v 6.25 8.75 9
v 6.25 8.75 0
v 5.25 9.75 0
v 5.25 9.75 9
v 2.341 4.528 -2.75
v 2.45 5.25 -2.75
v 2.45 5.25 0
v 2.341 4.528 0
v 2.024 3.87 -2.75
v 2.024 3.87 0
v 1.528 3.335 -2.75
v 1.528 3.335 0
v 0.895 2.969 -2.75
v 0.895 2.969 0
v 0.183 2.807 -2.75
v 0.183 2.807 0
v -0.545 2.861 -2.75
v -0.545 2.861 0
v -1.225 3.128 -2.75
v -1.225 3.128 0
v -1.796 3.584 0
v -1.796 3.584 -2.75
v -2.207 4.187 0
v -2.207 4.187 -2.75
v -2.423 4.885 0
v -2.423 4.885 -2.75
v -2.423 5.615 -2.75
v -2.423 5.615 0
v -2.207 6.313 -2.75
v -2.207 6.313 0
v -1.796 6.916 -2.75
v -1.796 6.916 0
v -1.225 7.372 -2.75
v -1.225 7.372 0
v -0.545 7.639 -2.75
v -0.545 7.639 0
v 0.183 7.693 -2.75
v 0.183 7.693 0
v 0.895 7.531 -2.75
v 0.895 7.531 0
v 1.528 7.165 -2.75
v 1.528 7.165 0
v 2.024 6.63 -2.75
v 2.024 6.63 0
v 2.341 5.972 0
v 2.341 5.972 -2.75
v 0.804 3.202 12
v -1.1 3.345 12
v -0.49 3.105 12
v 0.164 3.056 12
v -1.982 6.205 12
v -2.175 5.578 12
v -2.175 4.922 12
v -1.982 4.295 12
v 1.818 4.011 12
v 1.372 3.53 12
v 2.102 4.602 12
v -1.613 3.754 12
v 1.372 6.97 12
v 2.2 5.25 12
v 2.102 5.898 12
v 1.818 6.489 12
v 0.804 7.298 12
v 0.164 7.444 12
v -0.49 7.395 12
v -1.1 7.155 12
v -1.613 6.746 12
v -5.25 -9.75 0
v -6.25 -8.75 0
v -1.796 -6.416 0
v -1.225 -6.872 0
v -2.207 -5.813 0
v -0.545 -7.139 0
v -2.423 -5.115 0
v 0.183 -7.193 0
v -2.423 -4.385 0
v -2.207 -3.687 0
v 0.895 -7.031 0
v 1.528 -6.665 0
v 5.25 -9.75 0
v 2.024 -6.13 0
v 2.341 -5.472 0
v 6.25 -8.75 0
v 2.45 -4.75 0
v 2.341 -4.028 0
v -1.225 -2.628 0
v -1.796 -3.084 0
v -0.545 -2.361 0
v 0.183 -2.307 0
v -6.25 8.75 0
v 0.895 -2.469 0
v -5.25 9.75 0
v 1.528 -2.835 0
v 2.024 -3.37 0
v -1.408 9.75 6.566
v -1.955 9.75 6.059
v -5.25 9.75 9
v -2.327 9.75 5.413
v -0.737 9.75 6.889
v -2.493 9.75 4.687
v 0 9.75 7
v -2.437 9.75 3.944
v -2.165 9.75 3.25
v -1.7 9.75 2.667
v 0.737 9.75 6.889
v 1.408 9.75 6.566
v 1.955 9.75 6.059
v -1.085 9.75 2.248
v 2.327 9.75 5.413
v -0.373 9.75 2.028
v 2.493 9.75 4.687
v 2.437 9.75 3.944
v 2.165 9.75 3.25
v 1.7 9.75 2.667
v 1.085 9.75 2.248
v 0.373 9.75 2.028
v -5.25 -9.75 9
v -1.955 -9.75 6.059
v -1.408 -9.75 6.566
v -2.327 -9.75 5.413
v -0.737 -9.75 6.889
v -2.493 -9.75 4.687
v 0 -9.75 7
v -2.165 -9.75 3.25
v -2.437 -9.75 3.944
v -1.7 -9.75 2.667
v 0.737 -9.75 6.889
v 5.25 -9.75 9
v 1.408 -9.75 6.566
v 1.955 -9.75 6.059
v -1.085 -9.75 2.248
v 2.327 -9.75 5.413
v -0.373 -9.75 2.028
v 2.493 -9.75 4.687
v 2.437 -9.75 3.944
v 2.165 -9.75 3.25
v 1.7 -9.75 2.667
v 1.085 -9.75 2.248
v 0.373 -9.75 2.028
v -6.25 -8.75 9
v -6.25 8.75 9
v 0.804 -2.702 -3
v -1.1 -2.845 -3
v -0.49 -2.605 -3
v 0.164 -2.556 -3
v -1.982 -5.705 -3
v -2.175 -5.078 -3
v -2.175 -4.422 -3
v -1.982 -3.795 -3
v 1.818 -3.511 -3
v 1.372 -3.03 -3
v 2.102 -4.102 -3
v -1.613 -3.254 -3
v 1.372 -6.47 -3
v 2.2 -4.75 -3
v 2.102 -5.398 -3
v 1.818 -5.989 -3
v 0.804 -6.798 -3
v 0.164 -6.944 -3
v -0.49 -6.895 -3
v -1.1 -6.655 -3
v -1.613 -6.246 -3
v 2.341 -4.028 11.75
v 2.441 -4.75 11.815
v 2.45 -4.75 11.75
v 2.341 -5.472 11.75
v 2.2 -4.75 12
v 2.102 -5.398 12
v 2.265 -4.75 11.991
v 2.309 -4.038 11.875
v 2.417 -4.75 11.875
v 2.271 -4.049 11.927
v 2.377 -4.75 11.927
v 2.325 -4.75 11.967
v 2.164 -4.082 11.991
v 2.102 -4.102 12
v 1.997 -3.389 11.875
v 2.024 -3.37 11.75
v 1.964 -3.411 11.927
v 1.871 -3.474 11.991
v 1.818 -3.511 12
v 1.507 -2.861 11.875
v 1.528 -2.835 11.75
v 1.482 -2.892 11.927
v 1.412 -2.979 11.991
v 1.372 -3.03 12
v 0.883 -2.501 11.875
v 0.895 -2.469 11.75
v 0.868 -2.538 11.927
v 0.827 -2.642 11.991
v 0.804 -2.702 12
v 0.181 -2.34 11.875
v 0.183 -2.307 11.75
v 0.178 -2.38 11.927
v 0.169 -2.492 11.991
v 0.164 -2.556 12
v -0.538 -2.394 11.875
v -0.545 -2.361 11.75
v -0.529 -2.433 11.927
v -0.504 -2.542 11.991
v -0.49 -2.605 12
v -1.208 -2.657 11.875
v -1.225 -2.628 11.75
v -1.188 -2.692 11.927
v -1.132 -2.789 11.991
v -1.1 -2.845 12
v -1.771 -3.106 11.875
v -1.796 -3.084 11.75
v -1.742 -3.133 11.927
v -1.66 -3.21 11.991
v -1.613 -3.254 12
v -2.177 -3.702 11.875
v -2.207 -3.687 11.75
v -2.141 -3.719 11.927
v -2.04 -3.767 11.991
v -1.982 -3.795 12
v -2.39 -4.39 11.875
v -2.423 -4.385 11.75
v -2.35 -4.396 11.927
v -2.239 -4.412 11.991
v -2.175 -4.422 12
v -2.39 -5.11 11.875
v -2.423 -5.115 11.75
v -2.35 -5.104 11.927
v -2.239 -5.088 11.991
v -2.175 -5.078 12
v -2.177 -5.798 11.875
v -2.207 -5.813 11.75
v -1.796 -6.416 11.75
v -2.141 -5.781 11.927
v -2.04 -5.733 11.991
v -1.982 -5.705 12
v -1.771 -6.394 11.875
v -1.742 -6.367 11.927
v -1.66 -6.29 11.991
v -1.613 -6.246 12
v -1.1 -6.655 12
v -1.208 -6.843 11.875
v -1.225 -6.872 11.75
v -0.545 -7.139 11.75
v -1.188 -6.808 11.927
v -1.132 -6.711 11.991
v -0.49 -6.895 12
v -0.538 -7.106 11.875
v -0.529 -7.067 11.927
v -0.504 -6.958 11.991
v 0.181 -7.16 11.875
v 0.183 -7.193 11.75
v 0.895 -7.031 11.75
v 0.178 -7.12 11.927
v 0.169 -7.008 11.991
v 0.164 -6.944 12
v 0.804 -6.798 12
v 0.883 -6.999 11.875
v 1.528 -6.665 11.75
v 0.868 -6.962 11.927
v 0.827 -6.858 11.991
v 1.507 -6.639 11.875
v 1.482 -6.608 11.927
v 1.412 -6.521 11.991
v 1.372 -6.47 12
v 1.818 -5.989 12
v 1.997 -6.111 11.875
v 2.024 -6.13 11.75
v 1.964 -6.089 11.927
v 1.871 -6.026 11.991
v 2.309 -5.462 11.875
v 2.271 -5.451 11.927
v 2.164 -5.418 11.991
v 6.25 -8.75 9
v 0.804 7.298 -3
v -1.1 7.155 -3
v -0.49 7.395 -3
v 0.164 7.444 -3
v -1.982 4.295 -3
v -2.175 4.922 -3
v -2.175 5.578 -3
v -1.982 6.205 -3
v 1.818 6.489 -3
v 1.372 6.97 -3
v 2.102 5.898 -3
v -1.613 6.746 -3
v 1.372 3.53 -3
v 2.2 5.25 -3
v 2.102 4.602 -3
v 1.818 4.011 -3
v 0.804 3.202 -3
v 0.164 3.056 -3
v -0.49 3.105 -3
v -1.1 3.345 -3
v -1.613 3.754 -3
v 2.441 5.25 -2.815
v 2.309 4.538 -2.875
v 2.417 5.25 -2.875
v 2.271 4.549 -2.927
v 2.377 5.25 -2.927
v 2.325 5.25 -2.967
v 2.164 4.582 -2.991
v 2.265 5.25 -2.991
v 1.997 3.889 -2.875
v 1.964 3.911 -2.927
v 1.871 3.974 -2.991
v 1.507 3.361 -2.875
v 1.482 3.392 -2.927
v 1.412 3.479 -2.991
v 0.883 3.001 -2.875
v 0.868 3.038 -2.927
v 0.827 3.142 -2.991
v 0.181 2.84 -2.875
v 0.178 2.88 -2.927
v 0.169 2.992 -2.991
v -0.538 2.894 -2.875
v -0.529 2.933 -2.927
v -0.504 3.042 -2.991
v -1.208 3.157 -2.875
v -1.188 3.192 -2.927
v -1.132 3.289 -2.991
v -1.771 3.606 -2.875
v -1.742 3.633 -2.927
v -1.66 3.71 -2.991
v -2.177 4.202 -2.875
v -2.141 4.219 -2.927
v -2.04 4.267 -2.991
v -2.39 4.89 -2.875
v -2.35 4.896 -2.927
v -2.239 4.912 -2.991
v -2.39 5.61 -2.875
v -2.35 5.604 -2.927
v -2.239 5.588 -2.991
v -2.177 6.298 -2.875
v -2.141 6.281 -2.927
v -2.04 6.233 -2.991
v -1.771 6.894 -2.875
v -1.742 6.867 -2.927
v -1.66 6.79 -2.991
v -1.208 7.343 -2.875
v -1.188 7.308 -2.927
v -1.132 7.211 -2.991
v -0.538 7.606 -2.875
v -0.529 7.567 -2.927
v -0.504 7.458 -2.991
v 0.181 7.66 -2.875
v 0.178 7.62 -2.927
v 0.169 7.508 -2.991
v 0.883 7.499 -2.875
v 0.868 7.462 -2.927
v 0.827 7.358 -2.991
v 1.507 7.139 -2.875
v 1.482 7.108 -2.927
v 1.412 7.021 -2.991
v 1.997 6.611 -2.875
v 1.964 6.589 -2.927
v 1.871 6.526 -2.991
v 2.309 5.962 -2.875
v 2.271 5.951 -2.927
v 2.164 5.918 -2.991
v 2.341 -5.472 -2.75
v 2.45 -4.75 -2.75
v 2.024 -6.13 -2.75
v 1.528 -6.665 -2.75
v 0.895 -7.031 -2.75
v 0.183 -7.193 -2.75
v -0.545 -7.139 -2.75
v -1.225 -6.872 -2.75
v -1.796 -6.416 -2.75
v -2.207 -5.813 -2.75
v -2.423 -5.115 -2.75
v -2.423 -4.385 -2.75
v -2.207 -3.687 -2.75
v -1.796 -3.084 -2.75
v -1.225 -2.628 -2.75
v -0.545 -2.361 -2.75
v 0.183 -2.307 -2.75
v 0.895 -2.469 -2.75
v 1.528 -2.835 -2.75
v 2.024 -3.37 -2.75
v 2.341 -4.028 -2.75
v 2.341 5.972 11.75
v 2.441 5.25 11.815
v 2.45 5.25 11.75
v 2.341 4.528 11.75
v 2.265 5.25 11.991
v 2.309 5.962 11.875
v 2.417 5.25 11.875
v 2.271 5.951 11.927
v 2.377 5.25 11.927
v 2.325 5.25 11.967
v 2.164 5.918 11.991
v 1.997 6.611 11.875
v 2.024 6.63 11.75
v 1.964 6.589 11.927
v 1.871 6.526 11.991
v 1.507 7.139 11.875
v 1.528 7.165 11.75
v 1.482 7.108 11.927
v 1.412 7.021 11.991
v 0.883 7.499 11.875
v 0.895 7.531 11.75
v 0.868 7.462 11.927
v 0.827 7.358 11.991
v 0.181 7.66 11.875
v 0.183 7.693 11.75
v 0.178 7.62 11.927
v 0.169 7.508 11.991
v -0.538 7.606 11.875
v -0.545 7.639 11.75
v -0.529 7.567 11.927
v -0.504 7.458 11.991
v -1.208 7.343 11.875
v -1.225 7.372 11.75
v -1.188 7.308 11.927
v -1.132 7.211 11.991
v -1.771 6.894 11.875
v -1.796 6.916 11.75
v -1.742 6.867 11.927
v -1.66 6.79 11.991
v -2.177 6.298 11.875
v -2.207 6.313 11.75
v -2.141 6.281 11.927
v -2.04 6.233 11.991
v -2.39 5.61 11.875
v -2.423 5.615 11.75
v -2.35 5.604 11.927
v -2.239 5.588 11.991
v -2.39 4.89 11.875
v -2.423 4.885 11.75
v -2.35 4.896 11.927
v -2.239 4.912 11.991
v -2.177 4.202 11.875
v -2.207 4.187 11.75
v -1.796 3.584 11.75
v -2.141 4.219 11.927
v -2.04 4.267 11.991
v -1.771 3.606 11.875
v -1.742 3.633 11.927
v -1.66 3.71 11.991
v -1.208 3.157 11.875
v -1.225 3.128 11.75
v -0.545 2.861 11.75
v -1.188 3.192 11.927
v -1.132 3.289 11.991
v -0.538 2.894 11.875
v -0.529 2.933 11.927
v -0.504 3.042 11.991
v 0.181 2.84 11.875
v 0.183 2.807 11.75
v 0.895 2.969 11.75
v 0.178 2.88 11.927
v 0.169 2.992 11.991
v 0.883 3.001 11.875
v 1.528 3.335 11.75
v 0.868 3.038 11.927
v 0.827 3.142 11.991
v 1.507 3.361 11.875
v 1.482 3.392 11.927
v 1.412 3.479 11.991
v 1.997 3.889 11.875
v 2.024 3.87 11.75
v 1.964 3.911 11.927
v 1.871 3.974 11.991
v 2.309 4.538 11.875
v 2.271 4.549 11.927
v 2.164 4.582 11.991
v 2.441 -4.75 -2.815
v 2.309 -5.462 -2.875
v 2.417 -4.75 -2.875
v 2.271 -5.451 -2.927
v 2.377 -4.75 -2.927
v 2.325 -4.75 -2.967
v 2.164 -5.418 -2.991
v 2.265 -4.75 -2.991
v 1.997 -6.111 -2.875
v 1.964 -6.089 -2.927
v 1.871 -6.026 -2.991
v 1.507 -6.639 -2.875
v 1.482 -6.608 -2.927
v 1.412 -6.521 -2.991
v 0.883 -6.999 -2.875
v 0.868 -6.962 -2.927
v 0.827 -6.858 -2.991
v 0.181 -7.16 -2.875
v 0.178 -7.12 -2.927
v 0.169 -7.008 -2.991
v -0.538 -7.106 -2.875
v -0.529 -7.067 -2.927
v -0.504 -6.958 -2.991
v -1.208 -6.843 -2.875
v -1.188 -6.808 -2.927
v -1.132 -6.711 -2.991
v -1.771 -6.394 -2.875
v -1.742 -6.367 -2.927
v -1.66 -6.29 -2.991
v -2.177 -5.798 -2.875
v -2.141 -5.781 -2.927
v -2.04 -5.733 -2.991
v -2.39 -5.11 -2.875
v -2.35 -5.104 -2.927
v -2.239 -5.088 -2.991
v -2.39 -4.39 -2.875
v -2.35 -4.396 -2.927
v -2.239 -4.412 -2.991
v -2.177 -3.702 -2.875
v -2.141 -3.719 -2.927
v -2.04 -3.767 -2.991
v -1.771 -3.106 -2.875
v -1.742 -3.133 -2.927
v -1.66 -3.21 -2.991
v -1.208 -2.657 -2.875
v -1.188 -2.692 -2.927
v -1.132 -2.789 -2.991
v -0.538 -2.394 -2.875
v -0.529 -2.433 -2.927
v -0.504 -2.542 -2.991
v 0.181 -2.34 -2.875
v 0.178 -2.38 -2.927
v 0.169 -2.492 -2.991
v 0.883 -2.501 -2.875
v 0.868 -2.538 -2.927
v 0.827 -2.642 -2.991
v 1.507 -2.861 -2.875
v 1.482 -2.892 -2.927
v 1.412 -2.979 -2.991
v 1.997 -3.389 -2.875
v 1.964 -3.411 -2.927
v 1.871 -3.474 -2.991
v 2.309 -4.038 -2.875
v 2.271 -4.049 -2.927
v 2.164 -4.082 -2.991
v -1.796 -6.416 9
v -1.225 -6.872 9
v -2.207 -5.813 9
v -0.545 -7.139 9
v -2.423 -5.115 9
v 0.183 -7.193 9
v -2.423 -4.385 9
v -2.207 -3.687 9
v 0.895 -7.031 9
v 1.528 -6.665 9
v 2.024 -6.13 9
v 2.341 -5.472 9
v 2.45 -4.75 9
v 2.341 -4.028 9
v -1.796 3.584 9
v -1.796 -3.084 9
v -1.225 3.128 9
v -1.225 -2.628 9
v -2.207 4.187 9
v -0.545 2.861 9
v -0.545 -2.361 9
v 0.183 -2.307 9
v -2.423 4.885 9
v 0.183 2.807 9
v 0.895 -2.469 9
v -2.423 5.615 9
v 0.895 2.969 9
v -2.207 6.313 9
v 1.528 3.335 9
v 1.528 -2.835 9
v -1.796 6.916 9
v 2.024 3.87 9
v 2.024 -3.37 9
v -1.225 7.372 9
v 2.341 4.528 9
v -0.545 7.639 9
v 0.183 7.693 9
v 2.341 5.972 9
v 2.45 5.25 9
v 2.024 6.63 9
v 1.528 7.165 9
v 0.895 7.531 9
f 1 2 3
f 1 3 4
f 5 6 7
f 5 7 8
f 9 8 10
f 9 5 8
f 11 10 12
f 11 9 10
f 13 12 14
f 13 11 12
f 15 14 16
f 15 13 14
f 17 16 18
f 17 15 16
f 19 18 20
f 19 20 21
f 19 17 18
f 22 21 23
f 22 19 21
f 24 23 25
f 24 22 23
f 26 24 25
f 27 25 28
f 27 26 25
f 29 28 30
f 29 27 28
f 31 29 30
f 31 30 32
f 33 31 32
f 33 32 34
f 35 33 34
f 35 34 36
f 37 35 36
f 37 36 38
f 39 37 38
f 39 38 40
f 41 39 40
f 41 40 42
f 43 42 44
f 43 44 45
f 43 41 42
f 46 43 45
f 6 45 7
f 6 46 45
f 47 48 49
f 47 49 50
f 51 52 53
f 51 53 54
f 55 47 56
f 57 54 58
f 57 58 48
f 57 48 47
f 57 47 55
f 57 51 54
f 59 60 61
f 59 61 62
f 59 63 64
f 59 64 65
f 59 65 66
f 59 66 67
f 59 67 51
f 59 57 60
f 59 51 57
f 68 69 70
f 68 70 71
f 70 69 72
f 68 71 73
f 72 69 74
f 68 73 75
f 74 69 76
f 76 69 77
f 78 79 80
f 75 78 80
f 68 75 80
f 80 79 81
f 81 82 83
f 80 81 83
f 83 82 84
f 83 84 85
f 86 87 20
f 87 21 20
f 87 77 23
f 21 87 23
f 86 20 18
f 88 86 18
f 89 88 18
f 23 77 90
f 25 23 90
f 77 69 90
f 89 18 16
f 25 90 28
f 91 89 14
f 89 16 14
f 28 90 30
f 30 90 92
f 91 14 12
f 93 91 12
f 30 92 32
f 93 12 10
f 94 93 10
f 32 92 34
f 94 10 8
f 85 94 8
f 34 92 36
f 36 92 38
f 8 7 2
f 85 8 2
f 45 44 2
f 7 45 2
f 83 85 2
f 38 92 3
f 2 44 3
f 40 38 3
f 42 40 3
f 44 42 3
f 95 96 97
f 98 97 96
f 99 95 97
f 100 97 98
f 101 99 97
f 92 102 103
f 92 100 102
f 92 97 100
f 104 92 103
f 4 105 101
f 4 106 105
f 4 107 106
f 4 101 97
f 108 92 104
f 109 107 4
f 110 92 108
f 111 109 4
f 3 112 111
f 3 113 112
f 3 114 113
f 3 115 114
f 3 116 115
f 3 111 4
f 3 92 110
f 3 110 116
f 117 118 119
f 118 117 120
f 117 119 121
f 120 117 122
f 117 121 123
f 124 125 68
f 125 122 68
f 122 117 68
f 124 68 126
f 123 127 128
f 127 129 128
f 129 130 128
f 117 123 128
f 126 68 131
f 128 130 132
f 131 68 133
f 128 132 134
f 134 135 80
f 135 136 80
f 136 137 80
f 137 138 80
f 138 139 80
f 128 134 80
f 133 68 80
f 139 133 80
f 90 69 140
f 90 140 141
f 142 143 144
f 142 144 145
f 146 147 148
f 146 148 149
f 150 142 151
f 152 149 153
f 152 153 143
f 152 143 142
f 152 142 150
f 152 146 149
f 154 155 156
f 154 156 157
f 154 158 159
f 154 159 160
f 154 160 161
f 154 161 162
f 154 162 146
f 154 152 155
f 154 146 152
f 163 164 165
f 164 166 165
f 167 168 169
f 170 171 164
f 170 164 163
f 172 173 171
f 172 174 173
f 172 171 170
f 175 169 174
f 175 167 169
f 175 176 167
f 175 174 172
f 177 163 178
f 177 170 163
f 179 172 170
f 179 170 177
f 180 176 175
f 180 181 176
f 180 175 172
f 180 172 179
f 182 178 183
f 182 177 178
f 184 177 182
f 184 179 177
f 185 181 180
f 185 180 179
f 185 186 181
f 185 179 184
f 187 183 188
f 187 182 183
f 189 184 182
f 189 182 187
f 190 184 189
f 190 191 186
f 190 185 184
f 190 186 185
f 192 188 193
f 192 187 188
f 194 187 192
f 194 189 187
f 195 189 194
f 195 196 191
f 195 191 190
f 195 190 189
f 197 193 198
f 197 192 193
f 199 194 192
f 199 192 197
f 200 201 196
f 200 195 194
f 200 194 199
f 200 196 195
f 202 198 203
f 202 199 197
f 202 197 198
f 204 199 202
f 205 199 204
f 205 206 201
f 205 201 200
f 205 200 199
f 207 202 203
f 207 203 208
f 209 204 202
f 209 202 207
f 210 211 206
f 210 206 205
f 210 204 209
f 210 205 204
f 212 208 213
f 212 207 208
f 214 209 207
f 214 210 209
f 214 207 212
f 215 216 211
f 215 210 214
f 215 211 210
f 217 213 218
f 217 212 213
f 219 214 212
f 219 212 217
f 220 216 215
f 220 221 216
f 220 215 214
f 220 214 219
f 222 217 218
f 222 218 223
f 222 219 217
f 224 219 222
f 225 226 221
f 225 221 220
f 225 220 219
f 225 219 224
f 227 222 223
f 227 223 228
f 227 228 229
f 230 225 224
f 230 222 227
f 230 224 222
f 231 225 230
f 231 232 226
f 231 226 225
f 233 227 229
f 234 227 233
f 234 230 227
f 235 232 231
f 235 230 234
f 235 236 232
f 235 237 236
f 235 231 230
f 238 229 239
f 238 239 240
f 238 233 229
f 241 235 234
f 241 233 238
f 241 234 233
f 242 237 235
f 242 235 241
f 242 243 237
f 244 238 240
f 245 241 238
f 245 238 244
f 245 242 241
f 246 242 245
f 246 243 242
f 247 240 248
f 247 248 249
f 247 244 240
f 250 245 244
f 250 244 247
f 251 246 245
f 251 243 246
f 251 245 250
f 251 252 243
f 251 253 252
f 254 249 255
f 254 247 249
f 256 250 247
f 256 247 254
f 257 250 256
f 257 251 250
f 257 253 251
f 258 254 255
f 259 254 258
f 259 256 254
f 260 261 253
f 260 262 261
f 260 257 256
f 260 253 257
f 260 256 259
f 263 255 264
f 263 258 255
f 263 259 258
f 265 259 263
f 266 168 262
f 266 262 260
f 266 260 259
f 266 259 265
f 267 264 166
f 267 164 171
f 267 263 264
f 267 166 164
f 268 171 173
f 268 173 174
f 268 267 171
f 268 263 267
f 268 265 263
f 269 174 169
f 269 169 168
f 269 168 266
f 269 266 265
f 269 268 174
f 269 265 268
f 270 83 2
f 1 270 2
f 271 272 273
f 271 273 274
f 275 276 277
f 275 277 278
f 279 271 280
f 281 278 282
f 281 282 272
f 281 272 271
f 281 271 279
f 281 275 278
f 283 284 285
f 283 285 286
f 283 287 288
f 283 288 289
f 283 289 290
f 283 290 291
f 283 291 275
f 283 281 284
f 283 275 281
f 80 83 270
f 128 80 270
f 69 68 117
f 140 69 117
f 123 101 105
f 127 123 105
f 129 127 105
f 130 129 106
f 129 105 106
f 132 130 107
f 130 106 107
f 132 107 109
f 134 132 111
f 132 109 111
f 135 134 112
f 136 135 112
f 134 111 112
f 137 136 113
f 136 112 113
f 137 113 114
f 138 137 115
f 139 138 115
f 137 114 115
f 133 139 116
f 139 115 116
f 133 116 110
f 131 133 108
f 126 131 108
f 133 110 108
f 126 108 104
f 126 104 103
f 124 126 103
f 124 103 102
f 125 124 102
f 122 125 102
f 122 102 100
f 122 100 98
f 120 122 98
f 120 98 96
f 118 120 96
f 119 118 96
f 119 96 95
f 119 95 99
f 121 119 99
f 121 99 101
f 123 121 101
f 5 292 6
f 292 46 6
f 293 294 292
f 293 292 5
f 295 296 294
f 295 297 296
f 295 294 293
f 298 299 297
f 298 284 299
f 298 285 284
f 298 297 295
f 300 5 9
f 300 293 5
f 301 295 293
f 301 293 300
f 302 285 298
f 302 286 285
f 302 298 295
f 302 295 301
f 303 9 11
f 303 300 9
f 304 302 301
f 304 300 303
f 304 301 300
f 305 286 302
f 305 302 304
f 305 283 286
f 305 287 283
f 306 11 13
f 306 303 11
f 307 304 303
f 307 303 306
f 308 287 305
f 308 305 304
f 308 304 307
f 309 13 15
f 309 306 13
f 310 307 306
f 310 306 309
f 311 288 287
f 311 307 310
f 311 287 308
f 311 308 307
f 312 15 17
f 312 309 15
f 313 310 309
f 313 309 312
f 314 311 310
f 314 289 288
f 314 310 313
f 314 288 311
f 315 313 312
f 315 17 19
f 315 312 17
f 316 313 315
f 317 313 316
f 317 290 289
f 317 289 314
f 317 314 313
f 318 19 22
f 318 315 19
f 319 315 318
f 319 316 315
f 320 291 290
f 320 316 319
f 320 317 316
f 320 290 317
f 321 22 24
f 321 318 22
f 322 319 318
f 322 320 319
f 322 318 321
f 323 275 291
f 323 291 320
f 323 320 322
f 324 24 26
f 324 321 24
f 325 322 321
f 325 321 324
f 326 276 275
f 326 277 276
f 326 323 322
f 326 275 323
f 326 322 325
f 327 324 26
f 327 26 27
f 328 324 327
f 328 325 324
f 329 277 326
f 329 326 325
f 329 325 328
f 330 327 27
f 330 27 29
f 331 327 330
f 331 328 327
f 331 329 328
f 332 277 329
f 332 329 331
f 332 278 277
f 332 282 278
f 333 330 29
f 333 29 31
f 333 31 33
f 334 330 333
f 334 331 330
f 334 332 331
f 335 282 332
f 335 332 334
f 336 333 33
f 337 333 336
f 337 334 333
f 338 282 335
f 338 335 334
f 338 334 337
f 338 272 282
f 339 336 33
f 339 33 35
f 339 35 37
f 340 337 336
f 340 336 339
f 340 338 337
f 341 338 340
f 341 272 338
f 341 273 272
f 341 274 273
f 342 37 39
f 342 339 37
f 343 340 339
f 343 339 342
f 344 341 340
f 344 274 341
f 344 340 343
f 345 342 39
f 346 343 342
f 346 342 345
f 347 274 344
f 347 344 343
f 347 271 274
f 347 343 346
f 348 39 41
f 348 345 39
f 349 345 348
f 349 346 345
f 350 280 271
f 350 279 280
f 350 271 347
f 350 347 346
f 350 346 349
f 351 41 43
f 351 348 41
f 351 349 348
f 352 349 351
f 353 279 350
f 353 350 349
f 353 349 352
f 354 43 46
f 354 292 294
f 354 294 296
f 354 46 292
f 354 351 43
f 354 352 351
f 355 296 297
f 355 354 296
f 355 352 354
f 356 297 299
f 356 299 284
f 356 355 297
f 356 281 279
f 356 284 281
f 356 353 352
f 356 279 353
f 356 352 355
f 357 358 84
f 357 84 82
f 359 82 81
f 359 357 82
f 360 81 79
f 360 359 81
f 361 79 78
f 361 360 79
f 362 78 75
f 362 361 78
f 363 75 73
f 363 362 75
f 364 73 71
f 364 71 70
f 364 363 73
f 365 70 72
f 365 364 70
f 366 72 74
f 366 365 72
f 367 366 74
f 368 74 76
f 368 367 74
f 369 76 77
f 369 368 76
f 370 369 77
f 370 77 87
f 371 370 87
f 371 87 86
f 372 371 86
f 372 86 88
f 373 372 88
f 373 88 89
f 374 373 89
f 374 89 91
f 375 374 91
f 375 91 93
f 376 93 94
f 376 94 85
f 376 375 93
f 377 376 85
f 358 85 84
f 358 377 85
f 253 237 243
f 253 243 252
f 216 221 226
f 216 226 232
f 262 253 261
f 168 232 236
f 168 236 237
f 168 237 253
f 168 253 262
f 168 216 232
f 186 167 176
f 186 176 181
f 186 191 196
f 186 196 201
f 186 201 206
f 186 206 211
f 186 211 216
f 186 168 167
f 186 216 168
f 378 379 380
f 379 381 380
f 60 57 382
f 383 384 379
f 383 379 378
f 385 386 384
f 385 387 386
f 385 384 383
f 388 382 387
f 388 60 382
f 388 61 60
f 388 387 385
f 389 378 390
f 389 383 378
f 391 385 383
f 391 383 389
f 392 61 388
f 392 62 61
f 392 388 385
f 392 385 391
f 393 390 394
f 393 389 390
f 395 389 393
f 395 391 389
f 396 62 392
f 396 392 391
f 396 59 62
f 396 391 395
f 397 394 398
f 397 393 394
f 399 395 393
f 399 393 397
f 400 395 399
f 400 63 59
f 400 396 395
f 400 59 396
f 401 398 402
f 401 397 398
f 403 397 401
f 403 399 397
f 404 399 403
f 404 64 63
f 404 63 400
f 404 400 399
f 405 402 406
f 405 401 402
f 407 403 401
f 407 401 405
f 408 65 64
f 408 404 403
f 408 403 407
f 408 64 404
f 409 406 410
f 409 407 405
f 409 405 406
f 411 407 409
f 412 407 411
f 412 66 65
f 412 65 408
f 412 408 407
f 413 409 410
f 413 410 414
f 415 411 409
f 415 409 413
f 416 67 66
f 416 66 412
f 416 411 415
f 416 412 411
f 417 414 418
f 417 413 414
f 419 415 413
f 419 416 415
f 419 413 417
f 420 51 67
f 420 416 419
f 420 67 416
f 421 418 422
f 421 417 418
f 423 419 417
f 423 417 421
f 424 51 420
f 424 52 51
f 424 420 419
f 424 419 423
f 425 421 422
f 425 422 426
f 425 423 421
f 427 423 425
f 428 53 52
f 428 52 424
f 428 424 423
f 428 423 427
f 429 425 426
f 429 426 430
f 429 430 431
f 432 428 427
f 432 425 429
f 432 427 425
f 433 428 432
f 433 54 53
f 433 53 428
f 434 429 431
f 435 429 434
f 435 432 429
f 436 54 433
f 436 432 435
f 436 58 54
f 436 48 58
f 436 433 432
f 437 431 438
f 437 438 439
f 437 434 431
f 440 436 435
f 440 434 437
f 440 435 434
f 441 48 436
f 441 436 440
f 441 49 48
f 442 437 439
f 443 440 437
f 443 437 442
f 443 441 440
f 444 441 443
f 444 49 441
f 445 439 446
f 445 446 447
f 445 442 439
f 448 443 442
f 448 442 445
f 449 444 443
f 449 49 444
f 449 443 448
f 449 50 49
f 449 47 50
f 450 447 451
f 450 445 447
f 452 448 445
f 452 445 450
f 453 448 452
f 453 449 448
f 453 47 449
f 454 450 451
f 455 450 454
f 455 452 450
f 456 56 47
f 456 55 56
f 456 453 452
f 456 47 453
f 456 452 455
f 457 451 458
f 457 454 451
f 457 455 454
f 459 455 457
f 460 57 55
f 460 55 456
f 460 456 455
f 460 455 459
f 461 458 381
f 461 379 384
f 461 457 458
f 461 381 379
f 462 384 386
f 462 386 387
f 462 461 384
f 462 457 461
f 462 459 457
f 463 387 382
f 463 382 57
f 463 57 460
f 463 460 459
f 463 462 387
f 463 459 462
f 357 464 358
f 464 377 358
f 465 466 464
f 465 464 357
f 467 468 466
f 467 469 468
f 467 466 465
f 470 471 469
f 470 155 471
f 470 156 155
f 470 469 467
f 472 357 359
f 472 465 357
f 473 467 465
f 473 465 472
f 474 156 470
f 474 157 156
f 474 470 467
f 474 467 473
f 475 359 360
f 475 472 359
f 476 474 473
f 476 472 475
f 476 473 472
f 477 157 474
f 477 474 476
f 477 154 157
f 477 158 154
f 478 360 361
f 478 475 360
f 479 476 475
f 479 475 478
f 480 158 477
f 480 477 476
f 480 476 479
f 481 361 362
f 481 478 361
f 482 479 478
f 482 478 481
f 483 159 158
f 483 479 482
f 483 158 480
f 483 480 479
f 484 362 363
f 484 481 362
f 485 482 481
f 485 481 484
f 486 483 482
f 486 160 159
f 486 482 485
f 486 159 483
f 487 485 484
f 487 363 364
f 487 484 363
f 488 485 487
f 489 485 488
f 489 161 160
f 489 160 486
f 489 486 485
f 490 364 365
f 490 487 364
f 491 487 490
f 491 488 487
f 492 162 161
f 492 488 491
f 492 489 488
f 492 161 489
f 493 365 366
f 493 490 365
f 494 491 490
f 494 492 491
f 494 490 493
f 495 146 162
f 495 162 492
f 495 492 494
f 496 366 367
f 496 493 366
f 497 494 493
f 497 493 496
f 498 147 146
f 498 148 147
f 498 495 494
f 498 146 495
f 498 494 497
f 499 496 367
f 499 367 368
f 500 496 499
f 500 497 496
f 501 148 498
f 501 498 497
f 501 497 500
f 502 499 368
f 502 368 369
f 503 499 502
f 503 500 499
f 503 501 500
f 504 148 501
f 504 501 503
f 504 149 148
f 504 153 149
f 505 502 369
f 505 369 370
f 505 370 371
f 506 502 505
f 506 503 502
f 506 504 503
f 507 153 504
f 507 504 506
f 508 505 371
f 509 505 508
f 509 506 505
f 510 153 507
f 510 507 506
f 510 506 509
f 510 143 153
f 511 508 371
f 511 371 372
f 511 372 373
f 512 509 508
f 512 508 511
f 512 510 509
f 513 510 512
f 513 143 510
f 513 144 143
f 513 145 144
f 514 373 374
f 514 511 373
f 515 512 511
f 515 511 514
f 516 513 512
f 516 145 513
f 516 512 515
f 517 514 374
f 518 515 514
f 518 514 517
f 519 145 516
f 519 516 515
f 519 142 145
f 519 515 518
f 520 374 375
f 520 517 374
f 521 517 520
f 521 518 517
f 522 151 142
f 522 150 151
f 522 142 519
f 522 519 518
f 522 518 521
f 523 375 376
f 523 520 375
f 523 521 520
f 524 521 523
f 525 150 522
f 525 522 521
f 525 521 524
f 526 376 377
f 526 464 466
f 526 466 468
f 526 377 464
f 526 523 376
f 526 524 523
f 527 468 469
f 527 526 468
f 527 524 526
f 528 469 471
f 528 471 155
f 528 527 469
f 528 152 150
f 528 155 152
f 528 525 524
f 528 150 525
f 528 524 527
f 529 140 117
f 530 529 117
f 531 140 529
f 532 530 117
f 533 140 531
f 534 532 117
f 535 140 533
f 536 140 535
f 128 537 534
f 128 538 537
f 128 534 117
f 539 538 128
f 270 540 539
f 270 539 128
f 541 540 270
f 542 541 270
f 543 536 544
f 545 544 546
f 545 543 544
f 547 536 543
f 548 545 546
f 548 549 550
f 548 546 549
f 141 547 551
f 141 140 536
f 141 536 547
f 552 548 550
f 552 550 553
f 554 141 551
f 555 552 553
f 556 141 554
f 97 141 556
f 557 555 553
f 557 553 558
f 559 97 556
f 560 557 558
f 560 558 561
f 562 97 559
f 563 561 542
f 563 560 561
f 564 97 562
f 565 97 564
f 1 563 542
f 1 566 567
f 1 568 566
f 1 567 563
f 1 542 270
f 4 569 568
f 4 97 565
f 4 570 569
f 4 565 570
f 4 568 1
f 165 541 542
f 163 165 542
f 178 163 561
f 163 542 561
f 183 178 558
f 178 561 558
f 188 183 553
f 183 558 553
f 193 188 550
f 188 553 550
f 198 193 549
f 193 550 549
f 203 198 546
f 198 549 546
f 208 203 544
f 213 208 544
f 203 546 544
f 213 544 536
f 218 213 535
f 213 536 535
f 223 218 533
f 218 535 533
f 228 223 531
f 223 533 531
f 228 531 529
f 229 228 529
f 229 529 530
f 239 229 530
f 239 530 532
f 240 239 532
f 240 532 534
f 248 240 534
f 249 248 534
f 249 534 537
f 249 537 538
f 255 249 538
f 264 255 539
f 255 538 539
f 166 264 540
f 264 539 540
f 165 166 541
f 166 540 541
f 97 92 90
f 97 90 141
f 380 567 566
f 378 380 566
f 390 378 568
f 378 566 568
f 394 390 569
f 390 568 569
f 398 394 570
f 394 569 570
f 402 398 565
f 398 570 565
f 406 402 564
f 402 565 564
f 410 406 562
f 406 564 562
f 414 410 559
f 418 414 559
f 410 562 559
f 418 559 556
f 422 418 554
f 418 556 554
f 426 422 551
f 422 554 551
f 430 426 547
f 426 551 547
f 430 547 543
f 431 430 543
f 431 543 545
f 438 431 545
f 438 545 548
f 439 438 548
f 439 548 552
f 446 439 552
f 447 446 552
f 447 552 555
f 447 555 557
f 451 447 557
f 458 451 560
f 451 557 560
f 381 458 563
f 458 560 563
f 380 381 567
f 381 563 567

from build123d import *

# Parameters (mm, degrees)
SKETCH_1_W         = 12.5
SKETCH_1_H         = 19.5
EXTRUDE_1_DEPTH    = 9
SKETCH_2_R         = 2.45
EXTRUDE_2_DEPTH    = 3
EXTRUDE_START      = 3
SKETCH_4_R         = 2.45
EXTRUDE_3_DEPTH    = 3
FILLET_1_R         = 0.25
HOLE_WIZARD_M6_1_D = 5
CHAMFER_1_SIZE     = 1


with BuildPart() as part:
    # 스케치1 → 보스-돌출1 (new body)
    with BuildSketch(Plane.XY):
        Rectangle(SKETCH_1_W, SKETCH_1_H)
    extrude(amount=EXTRUDE_1_DEPTH)

    # 스케치2 → 보스-돌출2 (add)
    with BuildSketch(Plane.XY.offset(9)):
        with Locations((0, 5.25)):
            Circle(SKETCH_2_R)
        with Locations((0, -4.75)):
            Circle(SKETCH_2_R)
    extrude(amount=EXTRUDE_2_DEPTH)

    # 스케치4 → 보스-돌출3 (add)
    with BuildSketch(Plane(origin=(0, 0, 0), x_dir=(-1, 0, 0), z_dir=(0, 0, -1)).offset(EXTRUDE_START)):
        with Locations(Location((0, -4.75, 0), (0, 0, 180))):
            Circle(SKETCH_4_R)
        with Locations(Location((0, 5.25, 0), (0, 0, 180))):
            Circle(SKETCH_4_R)
    extrude(amount=-EXTRUDE_3_DEPTH)

    # 필렛1
    fillet_1_edges = [part.edges().sort_by_distance(p)[0] for p in [
        (-2.45, -4.75, 12),
        (-2.45, 5.25, 12),
        (-2.45, -4.75, -3),
        (-2.45, 5.25, -3),
    ]]
    fillet(fillet_1_edges, radius=FILLET_1_R)

    # M6 탭을 위한 탭 드릴1 (through all)
    with Locations(Plane(origin=(0, -9.75, 4.5), x_dir=(0, 0, -1), z_dir=(0, -1, 0))):
        with Locations((0, 0)):
            Hole(HOLE_WIZARD_M6_1_D / 2)

    # 모따기1
    chamfer_1_edges = [part.edges().sort_by_distance(p)[0] for p in [
        (6.25, -9.75, 4.5),
        (-6.25, -9.75, 4.5),
        (-6.25, 9.75, 4.5),
        (6.25, 9.75, 4.5),
    ]]
    chamfer(chamfer_1_edges, length=CHAMFER_1_SIZE)


solid = part.part
